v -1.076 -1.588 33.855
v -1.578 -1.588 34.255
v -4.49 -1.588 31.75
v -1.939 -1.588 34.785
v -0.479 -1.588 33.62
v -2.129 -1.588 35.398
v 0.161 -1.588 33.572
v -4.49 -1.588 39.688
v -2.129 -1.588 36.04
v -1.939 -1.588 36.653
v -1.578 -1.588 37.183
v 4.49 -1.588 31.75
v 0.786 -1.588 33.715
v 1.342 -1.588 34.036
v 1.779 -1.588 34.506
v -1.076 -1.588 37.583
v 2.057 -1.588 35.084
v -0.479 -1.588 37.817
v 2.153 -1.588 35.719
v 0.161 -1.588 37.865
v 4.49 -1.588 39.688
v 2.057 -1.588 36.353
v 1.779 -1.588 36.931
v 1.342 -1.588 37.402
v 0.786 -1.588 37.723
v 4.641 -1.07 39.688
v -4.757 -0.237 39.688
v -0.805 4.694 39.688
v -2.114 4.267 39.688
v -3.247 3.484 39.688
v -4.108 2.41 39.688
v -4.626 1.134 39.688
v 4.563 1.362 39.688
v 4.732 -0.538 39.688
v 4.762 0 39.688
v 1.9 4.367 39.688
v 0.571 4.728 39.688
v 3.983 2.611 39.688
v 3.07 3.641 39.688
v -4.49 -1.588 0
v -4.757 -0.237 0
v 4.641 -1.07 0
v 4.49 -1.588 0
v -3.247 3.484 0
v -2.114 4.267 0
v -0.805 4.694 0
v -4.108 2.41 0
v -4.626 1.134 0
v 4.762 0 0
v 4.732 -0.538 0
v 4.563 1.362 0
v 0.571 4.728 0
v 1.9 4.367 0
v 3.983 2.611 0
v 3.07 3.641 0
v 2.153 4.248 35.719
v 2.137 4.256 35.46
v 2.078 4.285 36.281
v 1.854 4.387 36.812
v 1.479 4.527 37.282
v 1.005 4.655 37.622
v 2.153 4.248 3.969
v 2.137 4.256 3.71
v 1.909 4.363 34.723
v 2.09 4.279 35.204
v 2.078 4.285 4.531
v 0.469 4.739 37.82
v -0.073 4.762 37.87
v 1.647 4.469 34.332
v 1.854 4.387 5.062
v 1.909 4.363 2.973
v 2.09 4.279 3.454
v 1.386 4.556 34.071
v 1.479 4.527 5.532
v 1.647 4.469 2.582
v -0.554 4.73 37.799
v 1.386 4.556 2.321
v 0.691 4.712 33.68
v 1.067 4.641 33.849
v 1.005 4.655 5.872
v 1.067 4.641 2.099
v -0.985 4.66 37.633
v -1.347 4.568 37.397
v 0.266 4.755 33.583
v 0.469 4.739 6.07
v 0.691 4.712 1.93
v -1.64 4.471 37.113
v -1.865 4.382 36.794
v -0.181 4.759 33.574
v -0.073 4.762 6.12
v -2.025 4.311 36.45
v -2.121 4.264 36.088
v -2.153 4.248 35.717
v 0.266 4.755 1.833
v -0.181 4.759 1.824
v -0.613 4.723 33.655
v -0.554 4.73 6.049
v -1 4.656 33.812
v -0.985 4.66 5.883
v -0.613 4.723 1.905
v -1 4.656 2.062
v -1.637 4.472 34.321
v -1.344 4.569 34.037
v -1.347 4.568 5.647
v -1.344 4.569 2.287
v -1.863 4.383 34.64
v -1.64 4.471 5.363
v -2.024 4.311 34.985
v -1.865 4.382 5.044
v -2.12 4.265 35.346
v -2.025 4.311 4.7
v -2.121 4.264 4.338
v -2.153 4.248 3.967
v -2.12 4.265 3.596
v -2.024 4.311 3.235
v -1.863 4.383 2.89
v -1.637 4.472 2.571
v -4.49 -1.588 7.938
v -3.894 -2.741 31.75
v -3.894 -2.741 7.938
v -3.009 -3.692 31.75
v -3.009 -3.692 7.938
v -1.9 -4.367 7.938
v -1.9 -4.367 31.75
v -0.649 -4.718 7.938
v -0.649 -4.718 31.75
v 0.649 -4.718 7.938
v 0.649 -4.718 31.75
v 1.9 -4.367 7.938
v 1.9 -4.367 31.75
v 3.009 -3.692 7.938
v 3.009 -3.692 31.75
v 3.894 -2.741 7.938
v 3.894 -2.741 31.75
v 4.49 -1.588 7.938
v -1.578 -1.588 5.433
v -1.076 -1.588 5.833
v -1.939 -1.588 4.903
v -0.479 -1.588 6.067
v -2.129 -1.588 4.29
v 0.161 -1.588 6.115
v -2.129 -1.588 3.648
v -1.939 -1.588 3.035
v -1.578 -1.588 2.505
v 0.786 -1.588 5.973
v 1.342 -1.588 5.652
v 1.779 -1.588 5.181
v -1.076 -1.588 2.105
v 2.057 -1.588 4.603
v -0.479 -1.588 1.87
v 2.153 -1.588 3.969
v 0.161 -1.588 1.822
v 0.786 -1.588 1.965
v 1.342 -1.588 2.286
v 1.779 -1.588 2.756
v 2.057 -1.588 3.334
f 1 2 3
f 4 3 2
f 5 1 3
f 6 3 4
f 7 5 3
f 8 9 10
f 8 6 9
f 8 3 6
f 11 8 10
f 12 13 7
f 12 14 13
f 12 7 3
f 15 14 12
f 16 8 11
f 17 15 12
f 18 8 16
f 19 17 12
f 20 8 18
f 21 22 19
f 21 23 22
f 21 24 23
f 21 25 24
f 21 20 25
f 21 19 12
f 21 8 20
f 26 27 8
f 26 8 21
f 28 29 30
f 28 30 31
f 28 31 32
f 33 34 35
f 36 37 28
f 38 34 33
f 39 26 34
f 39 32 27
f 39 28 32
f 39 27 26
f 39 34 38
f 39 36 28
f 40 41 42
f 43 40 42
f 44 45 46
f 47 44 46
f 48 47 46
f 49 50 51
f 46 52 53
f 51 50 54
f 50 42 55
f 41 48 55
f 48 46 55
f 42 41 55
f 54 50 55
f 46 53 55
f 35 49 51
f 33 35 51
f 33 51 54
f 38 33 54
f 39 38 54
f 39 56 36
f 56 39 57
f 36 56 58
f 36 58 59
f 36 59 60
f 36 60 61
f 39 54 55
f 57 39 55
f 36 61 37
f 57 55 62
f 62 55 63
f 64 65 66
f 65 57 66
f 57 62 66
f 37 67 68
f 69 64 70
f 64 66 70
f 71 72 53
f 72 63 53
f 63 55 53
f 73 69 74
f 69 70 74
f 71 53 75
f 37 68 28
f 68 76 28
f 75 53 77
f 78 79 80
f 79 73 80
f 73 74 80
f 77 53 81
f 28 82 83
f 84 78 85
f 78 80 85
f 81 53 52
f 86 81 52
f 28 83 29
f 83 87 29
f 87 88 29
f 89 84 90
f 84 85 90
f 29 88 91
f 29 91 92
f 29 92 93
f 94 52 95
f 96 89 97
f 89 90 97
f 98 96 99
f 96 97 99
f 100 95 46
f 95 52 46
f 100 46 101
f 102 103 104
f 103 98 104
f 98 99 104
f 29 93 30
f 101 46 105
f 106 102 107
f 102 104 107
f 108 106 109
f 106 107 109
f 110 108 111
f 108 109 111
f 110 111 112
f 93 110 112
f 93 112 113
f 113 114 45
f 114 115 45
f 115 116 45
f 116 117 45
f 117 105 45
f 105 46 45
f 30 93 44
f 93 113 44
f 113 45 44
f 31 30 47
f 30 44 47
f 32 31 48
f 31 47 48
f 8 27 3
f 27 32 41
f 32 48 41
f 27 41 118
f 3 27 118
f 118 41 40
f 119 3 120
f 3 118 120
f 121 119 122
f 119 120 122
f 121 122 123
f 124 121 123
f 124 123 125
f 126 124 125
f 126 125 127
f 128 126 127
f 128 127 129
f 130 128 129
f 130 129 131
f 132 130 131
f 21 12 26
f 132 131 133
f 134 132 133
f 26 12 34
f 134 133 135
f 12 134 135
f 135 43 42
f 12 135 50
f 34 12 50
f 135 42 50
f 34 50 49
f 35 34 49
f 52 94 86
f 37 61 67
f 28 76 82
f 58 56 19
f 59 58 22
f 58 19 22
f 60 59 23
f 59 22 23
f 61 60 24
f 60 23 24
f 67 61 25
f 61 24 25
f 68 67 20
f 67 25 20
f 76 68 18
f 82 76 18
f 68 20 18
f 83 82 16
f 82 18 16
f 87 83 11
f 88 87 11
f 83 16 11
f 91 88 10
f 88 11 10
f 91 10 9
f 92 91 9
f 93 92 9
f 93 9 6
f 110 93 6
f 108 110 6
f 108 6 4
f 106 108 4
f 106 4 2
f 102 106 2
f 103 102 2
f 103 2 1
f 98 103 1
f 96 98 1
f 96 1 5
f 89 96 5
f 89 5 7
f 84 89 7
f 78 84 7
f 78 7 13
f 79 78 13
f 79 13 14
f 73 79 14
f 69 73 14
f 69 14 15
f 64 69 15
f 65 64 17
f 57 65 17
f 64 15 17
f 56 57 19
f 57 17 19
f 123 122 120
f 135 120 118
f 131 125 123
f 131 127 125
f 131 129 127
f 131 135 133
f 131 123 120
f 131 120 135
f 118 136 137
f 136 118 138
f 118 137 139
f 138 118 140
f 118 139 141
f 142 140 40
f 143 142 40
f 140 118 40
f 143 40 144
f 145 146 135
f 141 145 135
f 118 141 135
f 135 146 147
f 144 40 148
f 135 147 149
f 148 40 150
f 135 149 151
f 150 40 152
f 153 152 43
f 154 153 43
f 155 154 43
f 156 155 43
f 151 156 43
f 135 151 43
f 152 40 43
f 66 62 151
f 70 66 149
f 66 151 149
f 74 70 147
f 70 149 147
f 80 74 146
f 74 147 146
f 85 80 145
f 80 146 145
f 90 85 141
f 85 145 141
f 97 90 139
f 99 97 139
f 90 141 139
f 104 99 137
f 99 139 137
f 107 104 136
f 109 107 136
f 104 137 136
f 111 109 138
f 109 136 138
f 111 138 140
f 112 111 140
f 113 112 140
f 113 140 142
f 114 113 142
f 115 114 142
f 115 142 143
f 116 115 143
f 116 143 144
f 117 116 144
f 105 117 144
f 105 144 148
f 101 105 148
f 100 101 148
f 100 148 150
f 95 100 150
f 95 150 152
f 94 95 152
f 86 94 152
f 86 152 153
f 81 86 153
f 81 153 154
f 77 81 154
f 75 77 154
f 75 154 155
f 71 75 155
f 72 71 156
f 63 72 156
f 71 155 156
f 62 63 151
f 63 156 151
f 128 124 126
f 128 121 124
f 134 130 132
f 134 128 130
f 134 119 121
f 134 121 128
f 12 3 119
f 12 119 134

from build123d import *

# Parameters (mm, degrees)
F0_R     = 4.7625
F1_DEPTH = 39.6875
F2_W     = 8.9802561211
F2_H     = 3.175
F3_DEPTH = 7.9375
F4_W     = 8.9802561211
F4_H     = 3.175
F5_DEPTH = 7.9375
F6_R     = 2.15265
F7_DEPTH = 7.3500001002


with BuildPart() as f1:
    # F0 (on Top) → F1 (new body)
    with BuildSketch(Plane.XY):
        Circle(F0_R)
    extrude(amount=F1_DEPTH)

    # F2 (on face) → F3 (cut)
    with BuildSketch(Plane.XY.offset(39.6875)):
        with Locations((0, -3.175)):
            Rectangle(F2_W, F2_H)
    extrude(amount=-F3_DEPTH, mode=Mode.SUBTRACT)

    # F4 (on face) → F5 (cut)
    with BuildSketch(Plane(origin=(0, 0, 0), x_dir=(1, 0, 0), z_dir=(0, 0, -1))):
        with Locations((0, 3.175)):
            Rectangle(F4_W, F4_H)
    extrude(amount=-F5_DEPTH, mode=Mode.SUBTRACT)

    # F6 (on face) → F7 (cut, up to face)
    with BuildSketch(Plane.XZ.offset(1.5875)):
        with Locations((0, 35.71875)):
            Circle(F6_R)
        with Locations((0, 3.96875)):
            Circle(F6_R)
    extrude(amount=-F7_DEPTH, mode=Mode.SUBTRACT)


solid = f1.part
